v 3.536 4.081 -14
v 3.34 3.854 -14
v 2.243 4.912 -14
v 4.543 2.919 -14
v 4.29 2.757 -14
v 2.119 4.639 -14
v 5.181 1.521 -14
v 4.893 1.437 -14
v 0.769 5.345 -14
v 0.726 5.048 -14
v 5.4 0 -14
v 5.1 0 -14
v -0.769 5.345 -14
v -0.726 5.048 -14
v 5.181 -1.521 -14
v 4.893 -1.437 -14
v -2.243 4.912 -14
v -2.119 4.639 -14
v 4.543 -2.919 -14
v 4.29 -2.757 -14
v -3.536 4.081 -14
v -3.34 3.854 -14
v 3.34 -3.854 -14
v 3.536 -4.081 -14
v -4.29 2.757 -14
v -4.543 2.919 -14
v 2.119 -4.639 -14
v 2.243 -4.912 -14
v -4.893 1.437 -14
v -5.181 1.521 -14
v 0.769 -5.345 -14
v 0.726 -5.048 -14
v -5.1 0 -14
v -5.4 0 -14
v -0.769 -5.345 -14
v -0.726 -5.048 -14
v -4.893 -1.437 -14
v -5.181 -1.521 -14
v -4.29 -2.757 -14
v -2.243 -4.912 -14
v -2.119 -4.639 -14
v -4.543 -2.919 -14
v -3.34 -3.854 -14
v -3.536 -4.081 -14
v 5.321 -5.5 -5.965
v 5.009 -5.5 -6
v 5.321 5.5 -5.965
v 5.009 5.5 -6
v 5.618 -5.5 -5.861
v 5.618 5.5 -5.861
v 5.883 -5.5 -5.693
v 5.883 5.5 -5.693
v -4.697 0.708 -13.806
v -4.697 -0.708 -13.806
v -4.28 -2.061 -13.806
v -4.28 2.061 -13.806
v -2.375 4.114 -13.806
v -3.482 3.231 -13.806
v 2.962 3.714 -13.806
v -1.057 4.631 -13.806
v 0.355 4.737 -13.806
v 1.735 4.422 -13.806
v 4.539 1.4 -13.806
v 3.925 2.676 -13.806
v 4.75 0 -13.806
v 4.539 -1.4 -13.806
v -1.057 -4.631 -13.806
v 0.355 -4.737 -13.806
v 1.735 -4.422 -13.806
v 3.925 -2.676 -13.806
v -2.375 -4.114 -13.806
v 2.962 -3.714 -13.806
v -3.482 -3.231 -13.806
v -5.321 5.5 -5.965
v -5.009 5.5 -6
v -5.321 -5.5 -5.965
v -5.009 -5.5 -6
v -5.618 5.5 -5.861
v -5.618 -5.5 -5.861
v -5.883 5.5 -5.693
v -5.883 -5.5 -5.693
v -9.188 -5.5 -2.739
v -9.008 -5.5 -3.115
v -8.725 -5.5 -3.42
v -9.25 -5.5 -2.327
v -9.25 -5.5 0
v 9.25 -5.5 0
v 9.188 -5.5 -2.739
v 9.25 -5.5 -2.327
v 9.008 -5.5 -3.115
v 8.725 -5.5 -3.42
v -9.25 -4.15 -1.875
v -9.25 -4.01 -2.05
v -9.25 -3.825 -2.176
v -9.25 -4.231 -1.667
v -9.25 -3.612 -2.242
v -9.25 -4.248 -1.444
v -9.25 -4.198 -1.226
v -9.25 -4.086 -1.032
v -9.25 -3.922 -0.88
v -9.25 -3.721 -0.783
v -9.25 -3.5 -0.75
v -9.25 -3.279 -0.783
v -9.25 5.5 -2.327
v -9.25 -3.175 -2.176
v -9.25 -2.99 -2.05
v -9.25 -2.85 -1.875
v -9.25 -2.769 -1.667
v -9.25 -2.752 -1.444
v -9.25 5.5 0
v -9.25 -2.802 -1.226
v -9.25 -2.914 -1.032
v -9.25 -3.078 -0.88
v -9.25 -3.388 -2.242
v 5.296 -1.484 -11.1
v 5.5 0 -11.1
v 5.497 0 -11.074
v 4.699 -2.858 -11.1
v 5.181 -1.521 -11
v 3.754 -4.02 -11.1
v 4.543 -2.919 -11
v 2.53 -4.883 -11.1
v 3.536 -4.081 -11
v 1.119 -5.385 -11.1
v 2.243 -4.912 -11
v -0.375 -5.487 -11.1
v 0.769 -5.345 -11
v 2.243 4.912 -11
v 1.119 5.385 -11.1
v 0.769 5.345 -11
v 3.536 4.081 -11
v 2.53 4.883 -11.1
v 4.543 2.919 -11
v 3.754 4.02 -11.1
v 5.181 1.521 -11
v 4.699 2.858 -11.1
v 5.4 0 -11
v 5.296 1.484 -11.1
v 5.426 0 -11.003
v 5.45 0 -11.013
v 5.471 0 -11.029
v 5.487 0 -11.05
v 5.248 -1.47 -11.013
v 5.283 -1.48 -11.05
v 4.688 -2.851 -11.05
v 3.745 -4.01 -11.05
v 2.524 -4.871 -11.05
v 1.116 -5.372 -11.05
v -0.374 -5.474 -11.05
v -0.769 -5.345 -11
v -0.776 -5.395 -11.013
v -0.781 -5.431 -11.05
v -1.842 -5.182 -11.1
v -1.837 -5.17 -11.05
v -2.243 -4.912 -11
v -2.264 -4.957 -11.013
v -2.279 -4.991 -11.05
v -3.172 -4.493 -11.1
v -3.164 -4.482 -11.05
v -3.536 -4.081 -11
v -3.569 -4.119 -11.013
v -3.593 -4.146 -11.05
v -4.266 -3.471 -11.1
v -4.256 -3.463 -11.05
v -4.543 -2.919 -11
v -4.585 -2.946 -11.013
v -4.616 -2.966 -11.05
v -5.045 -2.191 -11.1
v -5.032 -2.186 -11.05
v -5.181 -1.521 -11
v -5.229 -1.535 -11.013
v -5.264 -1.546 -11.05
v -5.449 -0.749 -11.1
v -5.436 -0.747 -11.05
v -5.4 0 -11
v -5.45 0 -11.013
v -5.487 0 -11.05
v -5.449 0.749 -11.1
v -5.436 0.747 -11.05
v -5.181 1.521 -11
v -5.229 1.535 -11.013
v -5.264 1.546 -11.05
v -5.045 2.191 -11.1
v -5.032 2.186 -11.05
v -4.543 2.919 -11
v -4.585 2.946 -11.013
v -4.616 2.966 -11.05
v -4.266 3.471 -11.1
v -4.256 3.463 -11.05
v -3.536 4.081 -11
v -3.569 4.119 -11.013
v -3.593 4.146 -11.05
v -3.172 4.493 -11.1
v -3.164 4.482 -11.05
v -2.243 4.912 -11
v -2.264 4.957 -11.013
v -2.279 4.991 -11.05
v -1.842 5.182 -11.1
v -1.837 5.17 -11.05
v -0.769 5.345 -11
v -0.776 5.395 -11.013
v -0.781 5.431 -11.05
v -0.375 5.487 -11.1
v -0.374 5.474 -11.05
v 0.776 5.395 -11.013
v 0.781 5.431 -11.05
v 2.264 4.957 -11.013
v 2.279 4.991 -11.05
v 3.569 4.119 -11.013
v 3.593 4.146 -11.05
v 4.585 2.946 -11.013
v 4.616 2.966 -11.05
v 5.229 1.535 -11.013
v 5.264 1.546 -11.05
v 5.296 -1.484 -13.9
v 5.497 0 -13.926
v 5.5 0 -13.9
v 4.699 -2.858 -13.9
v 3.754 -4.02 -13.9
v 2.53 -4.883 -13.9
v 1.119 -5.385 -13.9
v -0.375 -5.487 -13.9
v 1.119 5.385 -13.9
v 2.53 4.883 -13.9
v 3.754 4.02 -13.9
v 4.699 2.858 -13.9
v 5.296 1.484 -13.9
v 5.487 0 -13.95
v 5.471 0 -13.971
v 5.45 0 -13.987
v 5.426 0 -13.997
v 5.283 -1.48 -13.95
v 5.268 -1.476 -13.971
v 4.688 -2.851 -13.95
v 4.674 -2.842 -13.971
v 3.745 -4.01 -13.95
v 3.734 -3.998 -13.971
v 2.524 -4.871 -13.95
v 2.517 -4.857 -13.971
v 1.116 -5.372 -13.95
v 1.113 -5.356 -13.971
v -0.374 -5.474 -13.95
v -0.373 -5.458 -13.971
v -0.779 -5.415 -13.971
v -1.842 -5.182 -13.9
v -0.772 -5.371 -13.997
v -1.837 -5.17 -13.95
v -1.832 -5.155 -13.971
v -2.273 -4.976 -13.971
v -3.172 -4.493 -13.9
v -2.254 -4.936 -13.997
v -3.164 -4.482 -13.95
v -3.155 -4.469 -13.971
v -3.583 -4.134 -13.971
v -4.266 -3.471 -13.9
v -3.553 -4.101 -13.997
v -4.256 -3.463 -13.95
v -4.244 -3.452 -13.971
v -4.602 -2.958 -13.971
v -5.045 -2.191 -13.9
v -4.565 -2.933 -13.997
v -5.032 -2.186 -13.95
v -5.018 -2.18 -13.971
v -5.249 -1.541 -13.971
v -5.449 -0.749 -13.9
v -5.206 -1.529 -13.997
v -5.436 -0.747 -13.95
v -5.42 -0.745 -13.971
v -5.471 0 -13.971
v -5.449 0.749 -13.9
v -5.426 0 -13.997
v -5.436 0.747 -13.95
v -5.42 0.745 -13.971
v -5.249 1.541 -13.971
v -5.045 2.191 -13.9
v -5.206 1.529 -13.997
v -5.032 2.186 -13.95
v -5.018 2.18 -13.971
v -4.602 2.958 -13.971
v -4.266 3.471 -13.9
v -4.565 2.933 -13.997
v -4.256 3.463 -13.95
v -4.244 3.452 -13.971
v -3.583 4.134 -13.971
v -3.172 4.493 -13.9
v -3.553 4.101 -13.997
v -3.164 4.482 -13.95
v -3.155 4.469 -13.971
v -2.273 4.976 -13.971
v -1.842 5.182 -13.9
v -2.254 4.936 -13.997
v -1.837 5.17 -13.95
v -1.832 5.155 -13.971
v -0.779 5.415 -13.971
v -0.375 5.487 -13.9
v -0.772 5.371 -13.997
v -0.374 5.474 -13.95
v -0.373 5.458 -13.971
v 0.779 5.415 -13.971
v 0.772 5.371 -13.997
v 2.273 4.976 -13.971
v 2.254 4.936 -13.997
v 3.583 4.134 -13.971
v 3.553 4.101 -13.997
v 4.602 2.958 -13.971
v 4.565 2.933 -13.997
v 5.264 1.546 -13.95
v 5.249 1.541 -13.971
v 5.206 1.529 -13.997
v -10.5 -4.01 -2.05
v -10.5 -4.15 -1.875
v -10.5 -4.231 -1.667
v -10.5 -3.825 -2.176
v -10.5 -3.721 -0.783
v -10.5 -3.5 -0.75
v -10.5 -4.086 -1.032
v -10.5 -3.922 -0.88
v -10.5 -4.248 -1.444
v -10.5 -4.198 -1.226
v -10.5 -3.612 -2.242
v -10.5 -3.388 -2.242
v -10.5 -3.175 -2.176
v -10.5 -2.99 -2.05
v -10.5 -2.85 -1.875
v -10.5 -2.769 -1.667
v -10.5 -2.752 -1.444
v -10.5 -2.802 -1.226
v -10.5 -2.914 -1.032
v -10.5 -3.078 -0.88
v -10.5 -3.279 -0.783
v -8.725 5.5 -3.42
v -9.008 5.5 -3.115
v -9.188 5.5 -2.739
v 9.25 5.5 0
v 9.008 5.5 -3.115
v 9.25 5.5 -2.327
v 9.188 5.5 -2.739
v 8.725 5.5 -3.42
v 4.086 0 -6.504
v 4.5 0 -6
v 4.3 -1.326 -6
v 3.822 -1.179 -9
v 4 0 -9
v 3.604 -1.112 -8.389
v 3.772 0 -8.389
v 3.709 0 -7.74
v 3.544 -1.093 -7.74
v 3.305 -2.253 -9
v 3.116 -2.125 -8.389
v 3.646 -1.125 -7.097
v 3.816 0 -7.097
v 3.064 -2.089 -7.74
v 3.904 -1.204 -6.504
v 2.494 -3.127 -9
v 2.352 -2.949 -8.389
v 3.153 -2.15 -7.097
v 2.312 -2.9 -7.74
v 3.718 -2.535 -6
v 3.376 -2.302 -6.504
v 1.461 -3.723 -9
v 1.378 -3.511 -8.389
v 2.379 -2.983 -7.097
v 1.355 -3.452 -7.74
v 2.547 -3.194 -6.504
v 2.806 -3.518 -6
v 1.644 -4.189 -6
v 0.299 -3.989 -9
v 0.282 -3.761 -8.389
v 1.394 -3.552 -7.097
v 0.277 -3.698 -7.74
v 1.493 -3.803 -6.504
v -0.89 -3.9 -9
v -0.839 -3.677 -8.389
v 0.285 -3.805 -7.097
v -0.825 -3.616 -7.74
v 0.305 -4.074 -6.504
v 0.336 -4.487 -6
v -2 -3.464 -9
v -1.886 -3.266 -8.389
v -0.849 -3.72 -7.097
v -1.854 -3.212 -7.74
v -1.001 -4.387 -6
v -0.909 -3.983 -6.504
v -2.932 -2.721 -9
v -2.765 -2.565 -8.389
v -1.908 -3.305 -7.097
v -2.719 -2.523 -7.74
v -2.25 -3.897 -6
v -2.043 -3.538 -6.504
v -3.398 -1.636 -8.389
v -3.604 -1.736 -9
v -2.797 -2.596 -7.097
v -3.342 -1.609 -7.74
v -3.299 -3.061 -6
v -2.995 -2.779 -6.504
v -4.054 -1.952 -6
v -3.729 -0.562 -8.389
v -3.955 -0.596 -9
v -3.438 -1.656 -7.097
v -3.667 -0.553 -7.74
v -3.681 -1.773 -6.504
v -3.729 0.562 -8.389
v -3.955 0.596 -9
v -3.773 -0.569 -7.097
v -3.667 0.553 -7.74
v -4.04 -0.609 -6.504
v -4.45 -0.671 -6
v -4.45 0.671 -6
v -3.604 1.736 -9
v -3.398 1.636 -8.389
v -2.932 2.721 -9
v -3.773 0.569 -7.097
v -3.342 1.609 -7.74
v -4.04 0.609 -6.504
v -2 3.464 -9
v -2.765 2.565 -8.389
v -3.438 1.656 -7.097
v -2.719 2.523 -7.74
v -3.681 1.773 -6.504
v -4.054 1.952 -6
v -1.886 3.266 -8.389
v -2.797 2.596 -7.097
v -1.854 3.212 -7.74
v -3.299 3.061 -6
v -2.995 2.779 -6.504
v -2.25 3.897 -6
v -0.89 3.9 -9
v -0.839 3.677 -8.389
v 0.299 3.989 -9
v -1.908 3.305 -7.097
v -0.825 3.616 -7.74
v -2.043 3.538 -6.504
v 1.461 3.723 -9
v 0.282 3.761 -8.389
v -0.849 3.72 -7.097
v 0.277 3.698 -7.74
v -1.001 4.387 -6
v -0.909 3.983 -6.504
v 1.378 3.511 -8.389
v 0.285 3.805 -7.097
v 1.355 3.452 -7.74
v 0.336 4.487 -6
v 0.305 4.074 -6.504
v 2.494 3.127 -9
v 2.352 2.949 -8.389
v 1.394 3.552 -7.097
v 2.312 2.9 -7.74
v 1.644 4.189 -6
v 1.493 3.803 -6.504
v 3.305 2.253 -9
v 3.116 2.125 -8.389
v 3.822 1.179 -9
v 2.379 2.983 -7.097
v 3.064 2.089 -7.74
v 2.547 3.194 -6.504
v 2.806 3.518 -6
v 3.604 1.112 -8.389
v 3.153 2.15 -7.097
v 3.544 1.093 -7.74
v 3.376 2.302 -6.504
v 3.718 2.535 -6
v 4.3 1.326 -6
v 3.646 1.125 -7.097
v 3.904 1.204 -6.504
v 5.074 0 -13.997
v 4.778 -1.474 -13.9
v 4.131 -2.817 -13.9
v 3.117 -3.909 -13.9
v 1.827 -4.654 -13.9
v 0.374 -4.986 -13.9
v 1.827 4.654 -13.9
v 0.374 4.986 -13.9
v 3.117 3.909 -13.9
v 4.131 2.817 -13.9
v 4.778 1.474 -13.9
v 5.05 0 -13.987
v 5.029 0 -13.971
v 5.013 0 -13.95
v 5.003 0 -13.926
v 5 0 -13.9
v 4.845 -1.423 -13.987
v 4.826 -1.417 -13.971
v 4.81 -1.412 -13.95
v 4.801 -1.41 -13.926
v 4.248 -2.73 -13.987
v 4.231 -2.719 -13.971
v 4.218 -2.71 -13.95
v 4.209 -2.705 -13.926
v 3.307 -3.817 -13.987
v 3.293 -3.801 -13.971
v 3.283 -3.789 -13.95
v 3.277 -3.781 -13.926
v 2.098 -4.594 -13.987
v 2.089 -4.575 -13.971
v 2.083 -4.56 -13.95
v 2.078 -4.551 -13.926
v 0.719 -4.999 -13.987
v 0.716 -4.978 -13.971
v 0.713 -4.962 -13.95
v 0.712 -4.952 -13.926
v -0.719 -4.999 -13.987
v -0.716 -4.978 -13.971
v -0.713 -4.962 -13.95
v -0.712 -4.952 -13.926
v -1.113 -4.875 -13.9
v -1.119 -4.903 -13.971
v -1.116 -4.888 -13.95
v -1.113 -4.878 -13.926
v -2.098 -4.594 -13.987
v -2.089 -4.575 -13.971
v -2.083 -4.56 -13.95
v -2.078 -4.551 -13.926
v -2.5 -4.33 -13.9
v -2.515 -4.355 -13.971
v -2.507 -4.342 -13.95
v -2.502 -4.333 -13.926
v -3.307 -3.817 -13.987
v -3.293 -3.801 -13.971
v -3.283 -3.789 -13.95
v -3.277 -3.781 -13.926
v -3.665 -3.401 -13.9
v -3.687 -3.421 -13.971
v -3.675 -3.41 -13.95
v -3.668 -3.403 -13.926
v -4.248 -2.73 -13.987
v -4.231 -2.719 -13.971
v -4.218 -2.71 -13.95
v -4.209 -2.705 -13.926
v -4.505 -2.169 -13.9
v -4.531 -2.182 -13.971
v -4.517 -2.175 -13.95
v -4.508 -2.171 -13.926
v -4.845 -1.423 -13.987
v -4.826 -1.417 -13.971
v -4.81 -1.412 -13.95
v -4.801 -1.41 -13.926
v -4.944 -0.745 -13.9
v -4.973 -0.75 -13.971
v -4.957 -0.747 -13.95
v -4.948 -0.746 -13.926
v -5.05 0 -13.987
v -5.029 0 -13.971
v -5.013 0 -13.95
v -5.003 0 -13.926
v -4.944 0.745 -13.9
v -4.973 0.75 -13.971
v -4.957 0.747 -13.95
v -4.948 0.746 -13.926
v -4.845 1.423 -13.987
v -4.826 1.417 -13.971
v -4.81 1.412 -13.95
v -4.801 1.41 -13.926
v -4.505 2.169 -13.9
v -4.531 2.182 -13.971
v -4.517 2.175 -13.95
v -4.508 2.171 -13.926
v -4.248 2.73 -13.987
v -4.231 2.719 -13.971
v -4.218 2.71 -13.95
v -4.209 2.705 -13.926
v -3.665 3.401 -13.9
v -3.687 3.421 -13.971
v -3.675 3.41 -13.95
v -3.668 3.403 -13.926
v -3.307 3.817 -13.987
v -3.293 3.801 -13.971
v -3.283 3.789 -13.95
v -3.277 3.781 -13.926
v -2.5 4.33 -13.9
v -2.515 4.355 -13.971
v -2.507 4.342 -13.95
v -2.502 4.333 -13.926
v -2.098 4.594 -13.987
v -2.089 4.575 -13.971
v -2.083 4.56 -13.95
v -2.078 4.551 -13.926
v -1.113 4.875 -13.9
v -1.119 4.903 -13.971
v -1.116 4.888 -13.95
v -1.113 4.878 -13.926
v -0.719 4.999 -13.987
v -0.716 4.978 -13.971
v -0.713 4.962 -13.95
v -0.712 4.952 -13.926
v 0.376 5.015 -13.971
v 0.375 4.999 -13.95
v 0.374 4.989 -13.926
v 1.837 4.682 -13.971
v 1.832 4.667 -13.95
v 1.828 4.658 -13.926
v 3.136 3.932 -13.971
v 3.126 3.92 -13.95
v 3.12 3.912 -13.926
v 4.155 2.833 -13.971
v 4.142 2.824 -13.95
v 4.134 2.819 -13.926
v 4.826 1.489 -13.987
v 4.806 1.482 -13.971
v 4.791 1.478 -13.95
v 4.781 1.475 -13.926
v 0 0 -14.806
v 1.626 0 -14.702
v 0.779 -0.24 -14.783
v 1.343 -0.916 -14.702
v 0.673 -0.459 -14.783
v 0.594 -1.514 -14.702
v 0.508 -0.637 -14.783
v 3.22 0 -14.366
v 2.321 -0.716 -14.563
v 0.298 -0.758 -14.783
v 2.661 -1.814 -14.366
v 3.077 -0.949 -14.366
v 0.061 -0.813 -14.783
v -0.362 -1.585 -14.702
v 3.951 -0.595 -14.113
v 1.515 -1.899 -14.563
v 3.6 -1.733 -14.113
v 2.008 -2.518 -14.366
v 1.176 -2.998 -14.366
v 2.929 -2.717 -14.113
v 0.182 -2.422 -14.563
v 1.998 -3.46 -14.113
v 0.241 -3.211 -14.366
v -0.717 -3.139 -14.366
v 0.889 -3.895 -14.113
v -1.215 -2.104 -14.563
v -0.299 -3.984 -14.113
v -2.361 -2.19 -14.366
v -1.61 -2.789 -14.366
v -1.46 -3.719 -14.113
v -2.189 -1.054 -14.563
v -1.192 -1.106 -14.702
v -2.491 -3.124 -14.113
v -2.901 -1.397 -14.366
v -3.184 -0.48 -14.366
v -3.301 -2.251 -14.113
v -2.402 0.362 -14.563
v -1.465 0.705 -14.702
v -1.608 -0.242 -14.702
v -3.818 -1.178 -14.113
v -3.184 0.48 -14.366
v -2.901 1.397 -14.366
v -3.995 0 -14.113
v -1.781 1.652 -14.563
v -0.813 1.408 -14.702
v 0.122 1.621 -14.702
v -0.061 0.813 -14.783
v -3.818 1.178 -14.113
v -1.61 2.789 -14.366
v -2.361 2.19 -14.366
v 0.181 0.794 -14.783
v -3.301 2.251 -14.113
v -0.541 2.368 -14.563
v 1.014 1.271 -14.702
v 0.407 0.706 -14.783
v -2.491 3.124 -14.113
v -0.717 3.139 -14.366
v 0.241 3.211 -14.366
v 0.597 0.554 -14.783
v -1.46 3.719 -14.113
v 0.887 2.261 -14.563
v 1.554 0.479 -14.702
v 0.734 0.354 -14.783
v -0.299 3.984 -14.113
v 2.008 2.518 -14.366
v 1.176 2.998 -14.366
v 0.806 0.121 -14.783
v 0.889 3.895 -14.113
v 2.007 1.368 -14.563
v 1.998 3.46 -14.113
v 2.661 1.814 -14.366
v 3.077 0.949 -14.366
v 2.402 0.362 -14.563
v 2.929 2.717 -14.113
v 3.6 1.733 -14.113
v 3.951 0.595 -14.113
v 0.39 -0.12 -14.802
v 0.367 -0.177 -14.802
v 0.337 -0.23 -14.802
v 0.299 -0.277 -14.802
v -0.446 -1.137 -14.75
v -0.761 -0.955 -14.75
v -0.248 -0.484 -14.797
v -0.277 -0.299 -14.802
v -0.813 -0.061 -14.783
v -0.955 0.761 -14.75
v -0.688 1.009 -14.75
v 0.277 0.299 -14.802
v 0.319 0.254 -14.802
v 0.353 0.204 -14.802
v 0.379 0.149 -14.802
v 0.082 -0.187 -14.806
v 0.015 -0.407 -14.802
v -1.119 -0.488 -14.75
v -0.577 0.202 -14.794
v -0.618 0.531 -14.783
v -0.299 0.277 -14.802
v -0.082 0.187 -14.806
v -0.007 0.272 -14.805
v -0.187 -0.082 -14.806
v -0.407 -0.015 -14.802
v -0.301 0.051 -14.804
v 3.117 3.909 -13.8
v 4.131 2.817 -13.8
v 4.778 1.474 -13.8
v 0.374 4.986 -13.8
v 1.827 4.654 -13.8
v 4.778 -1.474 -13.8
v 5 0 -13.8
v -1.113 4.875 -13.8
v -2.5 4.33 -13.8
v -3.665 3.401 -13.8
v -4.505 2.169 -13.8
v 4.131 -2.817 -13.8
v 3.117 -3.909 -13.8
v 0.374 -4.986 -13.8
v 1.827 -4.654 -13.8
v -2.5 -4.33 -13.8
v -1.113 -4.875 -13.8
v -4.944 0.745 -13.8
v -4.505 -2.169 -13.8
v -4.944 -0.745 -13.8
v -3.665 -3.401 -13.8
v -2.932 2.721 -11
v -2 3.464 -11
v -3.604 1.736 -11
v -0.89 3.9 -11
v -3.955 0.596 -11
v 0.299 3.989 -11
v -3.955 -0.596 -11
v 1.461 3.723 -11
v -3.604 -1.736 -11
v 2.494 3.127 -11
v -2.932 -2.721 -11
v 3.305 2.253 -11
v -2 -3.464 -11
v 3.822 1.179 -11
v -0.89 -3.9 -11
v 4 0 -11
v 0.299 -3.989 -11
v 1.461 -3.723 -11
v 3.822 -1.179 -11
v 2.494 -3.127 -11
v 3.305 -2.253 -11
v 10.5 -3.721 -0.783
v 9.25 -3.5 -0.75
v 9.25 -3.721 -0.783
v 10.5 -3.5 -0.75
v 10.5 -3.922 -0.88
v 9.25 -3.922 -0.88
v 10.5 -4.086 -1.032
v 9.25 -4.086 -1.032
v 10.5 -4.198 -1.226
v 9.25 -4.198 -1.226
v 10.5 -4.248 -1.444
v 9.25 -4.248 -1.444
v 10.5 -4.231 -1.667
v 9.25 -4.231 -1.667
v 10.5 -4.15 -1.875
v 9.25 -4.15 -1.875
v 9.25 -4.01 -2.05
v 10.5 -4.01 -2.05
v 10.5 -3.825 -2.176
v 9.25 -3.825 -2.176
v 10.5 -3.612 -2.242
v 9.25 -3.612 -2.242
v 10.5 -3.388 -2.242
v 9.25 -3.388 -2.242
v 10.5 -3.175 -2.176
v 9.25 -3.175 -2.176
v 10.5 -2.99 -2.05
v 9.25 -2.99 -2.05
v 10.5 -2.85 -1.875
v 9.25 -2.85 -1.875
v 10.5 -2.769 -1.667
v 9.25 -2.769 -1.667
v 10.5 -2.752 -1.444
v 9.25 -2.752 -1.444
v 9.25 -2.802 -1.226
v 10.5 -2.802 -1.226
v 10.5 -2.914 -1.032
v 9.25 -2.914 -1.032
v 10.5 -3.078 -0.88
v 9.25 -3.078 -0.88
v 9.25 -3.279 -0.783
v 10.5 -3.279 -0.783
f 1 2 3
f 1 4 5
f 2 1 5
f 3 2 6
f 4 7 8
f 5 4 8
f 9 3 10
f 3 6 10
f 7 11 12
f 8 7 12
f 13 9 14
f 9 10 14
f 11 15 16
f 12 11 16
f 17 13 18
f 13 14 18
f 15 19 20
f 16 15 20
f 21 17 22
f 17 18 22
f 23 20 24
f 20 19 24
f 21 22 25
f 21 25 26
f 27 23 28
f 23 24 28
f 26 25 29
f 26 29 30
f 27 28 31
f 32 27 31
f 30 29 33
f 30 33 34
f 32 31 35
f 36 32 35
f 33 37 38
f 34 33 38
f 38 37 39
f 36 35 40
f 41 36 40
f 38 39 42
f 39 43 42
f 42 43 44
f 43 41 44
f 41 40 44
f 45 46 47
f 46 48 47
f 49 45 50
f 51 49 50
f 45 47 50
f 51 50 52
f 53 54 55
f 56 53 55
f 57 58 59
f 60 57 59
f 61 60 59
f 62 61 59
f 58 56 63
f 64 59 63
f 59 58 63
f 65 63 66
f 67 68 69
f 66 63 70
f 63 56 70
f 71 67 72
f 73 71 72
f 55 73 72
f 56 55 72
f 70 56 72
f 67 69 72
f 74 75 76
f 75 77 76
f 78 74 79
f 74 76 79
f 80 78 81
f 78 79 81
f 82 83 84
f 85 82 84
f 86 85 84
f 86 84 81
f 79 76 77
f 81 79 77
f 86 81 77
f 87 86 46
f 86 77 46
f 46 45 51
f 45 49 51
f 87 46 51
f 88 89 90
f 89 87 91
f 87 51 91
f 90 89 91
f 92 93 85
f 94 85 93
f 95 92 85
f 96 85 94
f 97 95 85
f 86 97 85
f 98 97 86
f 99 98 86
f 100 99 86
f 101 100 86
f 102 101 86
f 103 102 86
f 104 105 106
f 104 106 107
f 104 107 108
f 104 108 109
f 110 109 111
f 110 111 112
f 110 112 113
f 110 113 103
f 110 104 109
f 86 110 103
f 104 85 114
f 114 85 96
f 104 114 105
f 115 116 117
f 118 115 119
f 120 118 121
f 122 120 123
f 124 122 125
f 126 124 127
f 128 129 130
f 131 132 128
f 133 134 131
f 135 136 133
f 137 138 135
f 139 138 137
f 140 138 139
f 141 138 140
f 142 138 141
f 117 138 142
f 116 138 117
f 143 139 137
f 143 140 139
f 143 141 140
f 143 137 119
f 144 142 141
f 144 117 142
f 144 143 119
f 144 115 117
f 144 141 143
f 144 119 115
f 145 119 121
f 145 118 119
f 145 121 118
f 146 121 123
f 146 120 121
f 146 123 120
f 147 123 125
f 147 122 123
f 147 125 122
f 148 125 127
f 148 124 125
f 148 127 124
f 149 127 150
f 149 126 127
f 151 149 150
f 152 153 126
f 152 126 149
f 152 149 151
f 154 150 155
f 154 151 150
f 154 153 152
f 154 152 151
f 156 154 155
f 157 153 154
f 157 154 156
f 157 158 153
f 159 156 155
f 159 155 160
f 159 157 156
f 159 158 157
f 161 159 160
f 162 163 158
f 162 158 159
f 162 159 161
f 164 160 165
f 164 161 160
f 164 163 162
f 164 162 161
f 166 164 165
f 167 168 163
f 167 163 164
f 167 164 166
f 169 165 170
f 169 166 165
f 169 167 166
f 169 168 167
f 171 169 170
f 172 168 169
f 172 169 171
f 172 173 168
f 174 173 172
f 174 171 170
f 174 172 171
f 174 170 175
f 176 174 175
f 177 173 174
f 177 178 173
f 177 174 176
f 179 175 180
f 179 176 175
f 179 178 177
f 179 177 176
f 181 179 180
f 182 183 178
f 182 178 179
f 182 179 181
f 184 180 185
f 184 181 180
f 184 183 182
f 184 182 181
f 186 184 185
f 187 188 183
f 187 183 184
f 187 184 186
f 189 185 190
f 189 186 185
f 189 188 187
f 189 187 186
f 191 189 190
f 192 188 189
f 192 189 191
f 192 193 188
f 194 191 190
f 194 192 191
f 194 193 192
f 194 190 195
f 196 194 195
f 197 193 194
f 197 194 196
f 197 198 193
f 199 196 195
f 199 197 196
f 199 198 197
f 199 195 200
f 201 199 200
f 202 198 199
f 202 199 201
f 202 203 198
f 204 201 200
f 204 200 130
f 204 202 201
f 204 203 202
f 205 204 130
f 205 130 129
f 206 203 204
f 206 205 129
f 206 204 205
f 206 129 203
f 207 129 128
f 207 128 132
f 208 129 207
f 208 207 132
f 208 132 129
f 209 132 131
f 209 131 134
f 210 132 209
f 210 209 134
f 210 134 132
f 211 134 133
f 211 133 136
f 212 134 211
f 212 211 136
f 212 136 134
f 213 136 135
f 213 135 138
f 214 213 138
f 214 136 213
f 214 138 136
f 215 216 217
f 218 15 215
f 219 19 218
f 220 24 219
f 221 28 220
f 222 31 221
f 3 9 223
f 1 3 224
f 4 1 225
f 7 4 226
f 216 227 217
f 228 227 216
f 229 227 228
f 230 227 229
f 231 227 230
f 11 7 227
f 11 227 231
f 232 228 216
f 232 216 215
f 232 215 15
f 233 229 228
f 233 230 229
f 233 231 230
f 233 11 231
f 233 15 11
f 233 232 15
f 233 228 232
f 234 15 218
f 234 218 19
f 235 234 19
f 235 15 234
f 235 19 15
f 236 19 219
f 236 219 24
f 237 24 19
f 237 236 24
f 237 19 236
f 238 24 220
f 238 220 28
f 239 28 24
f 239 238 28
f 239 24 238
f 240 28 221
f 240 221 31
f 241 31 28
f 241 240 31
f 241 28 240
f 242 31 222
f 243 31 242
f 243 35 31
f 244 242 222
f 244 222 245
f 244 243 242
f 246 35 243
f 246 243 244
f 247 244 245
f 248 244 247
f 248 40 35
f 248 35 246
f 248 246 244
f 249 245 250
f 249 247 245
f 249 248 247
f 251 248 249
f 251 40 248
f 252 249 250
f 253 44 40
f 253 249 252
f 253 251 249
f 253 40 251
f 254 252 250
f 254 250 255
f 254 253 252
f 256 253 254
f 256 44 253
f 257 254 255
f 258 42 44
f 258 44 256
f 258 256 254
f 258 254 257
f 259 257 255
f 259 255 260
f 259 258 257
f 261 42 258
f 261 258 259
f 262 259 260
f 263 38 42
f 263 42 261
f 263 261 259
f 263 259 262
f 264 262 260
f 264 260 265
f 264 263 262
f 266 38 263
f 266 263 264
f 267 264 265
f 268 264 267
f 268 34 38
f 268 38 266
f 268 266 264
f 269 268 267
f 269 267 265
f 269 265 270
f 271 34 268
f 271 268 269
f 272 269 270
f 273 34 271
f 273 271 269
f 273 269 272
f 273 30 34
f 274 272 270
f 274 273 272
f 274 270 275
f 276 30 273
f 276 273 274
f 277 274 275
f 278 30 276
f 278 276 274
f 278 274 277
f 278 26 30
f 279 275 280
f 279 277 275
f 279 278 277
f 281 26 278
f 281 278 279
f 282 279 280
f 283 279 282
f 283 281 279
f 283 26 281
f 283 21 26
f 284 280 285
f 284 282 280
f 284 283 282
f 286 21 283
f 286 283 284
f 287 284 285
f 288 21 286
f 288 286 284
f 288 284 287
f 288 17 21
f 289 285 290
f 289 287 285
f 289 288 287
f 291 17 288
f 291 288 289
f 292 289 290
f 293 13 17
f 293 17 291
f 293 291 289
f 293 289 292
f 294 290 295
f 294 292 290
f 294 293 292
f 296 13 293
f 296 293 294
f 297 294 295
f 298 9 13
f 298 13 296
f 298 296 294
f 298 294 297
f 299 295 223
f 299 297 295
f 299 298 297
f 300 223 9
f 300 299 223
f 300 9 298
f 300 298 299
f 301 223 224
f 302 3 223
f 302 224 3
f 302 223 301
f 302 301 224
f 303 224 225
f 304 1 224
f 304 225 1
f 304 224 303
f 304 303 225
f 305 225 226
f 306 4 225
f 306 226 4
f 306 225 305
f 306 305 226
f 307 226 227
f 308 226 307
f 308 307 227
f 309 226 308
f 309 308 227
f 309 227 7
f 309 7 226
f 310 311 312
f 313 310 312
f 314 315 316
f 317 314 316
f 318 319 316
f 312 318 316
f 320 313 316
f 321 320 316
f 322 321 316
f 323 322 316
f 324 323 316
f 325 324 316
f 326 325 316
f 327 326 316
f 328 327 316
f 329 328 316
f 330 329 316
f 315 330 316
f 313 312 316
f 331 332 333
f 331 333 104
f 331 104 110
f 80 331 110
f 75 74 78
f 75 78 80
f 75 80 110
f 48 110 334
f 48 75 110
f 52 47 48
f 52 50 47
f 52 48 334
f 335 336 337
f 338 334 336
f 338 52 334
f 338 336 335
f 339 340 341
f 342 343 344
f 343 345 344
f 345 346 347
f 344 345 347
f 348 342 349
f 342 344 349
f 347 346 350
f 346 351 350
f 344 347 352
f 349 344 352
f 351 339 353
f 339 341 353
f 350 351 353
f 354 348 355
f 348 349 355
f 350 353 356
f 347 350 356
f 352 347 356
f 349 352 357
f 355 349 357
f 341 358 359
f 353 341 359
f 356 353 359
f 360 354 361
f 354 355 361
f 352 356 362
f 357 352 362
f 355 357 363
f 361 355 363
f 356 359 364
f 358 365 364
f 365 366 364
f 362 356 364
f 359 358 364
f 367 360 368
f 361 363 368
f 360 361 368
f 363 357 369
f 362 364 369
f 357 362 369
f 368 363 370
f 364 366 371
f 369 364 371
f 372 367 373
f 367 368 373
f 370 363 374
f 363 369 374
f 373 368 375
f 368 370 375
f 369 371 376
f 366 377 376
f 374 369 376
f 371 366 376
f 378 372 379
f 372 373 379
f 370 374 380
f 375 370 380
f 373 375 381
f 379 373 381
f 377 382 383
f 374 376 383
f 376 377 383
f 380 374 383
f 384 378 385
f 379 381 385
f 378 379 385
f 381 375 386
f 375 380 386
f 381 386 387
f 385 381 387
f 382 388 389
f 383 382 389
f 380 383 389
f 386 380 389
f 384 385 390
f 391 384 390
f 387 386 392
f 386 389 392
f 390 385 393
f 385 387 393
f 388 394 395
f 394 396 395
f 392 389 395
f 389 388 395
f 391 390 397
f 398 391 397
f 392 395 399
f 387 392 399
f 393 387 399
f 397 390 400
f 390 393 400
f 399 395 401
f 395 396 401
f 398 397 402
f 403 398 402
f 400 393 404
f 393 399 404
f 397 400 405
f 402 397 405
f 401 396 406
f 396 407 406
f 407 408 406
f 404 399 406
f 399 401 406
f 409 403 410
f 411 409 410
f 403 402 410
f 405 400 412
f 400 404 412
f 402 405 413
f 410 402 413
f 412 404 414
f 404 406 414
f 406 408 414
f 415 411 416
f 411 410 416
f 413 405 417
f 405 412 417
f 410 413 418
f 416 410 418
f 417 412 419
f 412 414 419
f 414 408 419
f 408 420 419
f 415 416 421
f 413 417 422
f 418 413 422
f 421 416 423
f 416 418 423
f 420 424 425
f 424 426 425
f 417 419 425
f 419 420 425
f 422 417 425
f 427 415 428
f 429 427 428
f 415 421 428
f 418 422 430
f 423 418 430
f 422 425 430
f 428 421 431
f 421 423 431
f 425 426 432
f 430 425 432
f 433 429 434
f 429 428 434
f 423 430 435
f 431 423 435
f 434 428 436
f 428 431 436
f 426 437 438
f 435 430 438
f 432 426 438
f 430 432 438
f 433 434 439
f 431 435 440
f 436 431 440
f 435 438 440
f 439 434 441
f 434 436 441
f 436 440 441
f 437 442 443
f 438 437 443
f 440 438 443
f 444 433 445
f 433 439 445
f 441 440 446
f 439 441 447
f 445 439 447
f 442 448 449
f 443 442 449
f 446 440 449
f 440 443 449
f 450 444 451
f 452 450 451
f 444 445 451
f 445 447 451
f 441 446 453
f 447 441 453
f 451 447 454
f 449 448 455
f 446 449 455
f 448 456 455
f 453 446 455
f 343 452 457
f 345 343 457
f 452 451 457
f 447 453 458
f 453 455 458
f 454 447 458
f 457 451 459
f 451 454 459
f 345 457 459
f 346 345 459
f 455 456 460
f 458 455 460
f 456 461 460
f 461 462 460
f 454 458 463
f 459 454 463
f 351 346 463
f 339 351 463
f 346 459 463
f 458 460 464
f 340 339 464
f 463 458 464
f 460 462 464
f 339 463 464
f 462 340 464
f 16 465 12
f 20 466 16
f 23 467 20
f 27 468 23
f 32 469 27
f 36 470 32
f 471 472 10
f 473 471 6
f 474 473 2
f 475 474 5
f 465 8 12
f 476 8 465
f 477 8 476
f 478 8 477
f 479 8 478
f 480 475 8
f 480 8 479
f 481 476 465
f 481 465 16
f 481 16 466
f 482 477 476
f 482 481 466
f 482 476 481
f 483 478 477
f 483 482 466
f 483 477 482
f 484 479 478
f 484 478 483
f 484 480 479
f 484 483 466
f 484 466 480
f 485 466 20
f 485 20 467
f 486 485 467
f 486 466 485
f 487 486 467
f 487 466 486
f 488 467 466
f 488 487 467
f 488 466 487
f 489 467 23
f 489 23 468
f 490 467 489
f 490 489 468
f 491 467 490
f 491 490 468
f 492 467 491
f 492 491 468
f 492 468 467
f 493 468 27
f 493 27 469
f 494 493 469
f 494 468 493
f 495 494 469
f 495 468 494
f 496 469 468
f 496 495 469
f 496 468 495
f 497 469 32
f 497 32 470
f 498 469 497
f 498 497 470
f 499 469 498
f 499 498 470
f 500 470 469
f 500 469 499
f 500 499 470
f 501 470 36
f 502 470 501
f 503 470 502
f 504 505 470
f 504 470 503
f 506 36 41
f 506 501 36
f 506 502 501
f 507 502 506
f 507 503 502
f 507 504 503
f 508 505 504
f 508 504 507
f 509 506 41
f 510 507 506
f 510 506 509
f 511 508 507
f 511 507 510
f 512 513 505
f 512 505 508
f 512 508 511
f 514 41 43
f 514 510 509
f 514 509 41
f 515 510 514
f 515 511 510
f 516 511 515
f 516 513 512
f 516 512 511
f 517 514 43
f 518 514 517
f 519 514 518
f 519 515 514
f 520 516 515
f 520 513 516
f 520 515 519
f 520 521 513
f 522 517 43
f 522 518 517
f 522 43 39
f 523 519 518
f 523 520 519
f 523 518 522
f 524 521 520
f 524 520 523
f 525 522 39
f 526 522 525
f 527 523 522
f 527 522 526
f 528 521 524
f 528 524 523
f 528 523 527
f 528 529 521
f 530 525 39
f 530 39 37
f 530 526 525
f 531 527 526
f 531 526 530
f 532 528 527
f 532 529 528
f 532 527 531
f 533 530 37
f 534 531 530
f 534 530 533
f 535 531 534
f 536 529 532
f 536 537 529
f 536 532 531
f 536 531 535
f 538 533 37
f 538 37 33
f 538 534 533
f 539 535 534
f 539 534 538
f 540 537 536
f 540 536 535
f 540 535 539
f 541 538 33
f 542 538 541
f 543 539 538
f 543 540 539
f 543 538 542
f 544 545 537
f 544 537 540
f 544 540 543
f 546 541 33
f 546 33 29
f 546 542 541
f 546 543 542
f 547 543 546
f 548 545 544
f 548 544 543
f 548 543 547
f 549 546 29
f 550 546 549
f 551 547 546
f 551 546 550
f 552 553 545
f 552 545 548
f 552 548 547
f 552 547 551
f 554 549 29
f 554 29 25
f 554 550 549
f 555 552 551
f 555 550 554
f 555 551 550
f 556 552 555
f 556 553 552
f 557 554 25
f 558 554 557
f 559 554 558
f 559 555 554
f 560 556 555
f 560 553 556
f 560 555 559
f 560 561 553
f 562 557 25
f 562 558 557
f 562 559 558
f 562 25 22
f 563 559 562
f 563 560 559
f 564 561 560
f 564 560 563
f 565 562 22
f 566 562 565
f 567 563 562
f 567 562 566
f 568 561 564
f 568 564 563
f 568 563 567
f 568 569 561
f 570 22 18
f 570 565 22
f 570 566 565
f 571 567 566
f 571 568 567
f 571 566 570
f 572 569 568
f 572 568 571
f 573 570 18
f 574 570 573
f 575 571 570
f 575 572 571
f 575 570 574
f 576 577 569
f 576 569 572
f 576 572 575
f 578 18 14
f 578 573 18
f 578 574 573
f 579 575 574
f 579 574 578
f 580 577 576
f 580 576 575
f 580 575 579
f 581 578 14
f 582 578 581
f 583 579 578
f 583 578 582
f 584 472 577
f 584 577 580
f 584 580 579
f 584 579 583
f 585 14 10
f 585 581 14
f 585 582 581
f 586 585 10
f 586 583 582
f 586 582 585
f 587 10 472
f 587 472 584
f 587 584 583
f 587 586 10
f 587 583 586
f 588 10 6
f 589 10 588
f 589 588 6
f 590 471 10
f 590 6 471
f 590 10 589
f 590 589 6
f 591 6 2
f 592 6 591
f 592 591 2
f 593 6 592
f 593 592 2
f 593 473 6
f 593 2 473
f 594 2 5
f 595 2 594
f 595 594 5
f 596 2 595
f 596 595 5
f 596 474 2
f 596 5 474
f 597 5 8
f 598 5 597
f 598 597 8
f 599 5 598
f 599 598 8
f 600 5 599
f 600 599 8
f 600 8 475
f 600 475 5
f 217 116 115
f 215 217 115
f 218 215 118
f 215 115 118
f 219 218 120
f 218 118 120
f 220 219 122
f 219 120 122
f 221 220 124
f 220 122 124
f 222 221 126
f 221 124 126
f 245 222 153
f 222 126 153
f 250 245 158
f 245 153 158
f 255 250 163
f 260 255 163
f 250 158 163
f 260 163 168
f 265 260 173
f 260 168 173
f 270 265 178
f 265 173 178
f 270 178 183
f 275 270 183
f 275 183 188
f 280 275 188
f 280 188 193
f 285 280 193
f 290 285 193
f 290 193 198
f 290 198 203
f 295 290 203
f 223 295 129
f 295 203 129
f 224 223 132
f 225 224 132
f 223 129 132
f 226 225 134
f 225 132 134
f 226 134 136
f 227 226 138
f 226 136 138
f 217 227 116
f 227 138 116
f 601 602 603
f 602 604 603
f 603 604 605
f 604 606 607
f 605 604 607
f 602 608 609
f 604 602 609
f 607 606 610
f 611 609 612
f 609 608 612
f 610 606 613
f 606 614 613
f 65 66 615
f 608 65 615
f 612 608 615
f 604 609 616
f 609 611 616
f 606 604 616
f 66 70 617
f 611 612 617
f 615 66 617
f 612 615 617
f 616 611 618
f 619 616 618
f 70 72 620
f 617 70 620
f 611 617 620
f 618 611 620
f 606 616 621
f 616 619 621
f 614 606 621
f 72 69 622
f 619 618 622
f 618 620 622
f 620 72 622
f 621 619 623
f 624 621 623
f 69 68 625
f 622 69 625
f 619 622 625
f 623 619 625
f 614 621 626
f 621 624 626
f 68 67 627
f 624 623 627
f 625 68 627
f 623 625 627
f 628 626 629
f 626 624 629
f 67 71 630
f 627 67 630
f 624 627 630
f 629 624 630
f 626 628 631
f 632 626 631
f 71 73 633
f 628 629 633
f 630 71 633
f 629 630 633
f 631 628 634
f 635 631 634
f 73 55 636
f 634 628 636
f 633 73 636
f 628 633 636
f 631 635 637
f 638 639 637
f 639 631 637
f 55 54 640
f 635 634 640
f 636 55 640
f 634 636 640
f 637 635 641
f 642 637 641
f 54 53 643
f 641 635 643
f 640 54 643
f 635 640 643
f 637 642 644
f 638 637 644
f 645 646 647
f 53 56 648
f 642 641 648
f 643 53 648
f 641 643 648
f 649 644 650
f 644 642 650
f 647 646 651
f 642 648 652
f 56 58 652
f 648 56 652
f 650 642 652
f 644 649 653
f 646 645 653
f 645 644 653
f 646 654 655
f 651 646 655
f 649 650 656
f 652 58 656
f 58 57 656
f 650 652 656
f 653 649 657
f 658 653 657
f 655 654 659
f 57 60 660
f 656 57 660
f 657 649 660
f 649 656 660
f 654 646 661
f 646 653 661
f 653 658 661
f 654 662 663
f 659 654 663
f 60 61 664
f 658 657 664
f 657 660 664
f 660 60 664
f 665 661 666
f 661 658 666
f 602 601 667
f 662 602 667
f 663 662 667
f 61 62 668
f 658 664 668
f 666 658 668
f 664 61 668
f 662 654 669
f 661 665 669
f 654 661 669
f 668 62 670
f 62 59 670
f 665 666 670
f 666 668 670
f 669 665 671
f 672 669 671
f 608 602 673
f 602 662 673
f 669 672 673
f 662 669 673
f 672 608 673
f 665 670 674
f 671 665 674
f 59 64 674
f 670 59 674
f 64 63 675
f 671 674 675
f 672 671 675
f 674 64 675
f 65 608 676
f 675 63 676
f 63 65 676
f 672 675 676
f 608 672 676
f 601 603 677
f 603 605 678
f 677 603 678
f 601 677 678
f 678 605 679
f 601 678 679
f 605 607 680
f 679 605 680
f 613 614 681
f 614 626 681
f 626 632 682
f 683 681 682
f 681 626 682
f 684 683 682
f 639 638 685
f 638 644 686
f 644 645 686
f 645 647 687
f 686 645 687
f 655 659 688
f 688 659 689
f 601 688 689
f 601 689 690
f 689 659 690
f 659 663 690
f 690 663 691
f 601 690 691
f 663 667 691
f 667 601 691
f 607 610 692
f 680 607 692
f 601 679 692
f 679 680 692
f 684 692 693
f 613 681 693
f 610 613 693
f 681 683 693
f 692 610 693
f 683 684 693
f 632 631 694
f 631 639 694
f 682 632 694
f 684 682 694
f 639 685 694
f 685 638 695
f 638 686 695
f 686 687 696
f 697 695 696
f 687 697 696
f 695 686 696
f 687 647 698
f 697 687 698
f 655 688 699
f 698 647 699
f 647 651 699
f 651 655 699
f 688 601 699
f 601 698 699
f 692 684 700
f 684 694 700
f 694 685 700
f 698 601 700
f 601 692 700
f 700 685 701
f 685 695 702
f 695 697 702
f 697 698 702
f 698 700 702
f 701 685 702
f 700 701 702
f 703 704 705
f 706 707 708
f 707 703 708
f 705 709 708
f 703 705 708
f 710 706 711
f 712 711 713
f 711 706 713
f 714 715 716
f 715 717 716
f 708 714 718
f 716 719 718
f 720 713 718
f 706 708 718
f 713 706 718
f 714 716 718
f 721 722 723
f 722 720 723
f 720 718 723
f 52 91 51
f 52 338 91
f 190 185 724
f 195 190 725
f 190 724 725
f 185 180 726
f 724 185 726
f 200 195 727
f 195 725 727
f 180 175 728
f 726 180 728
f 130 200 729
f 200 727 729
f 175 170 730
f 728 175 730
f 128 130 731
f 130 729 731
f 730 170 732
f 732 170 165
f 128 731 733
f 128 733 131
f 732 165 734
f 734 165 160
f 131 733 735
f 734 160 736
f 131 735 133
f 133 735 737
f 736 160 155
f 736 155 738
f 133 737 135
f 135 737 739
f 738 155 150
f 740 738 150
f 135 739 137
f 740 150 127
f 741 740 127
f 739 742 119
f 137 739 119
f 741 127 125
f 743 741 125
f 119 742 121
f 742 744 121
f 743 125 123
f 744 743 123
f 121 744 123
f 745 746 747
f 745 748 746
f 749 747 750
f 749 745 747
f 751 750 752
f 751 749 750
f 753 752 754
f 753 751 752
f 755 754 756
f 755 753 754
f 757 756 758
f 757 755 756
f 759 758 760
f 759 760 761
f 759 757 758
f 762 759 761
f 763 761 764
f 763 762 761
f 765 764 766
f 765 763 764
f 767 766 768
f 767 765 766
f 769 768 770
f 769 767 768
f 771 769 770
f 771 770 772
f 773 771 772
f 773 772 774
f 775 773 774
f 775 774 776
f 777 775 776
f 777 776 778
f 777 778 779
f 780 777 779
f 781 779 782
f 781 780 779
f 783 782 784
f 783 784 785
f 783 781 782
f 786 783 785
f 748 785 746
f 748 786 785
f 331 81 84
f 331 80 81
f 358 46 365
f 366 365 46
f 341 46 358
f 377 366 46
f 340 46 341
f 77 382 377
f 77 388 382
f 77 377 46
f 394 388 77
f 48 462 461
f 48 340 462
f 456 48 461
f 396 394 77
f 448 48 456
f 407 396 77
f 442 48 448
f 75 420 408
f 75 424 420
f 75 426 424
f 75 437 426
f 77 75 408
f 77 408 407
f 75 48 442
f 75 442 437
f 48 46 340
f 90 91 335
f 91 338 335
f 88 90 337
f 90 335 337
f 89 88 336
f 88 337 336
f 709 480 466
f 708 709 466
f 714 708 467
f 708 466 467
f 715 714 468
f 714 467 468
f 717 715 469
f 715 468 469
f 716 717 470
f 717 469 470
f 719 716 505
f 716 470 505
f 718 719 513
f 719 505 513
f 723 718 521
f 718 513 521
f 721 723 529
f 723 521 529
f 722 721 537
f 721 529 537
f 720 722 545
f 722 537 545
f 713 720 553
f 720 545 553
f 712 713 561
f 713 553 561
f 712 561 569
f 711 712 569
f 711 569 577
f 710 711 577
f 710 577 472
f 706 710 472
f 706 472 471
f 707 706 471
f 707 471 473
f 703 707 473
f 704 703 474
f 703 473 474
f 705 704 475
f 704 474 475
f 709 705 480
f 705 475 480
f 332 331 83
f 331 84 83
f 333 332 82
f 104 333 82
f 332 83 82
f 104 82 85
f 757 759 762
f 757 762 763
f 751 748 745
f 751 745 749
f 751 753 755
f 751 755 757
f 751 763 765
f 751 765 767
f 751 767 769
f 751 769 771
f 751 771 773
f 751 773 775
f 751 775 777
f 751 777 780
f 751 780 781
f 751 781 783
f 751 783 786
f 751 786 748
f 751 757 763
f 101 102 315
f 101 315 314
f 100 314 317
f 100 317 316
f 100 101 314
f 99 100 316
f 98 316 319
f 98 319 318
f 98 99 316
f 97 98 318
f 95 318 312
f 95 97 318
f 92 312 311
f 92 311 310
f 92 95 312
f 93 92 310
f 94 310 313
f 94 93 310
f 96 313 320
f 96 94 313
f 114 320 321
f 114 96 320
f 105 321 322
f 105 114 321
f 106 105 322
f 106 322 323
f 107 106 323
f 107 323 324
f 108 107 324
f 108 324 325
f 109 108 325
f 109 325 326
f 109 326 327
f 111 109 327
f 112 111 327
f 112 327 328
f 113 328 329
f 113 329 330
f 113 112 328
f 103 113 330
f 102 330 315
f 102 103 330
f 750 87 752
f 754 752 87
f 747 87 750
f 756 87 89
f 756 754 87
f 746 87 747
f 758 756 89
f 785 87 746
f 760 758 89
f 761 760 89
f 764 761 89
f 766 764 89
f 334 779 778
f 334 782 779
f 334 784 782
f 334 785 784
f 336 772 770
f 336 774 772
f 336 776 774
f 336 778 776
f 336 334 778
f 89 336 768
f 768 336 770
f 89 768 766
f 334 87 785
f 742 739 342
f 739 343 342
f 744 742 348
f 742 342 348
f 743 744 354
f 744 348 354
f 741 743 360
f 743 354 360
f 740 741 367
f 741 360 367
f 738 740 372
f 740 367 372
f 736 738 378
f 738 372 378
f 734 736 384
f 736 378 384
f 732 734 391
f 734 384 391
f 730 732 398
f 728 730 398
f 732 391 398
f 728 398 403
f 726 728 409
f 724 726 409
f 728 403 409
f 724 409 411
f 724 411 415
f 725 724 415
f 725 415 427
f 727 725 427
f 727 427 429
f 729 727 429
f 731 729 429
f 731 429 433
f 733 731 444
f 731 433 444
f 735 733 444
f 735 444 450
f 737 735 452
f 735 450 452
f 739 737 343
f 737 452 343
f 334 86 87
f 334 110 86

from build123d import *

# Parameters (mm, degrees)
BOSS_EXTRUDE1_DEPTH = 5.5
SKETCH5_R           = 0.75
BOSS_EXTRUDE2_DEPTH = 10.5
FILLET1_R           = 0.1
FILLET2_R           = 1.4


with BuildPart() as part:
    # Sketch1 → Boss-Extrude1 (new, symmetric)
    with BuildSketch(Plane(origin=(0, 0, 0), x_dir=(1, 0, 0), z_dir=(0, 1, 0))):
        Polygon((-9.25, 0), (9.25, 0), (9.25, 3), (5.5, 6), (-5.5, 6), (-9.25, 3), align=None)
    extrude(amount=BOSS_EXTRUDE1_DEPTH, both=True)

    # Sketch3 → Revolve2 (revolve)
    with BuildSketch(Plane(origin=(0, 0, 0), x_dir=(1, 0, 0), z_dir=(0, 1, 0))):
        with BuildLine():
            Line((4.5, 6), (0, 6))
            Line((0, 6), (0, 13.8))
            Line((0, 13.8), (5, 13.8))
            Line((5, 13.8), (5, 14))
            Line((5, 14), (5.5, 14))
            Line((5.5, 14), (5.5, 11))
            Line((5.5, 11), (4, 11))
            Line((4, 11), (4, 9))
            ThreePointArc((4, 9), (3.741329953, 7.415221659), (4.5, 6))
        make_face()
    revolve(axis=Axis((0, 0, 0), (0, 0, -1)))

    # Sketch5 → Boss-Extrude2 (add, symmetric)
    with BuildSketch(Plane(origin=(0, 0, 0), x_dir=(0, 0, -1), z_dir=(1, 0, 0))):
        with Locations(Location((1.5, -3.5, 0), (0, 0, 180))):
            Circle(SKETCH5_R)
    extrude(amount=BOSS_EXTRUDE2_DEPTH, both=True)

    # Fillet1
    fillet1_edges = [part.edges().sort_by_distance(p)[0] for p in [
        (-5.5, 0, -11),
        (-5.5, 0, -14),
        (-5, 0, -14),
    ]]
    fillet(fillet1_edges, radius=FILLET1_R)

    # Fillet2
    fillet2_edges = [part.edges().sort_by_distance(p)[0] for p in [
        (-9.25, 0, -3),
        (-5.5, 0, -6),
        (5.5, 0, -6),
        (9.25, 0, -3),
    ]]
    fillet(fillet2_edges, radius=FILLET2_R)


with BuildPart() as body_2:
    # Sketch4 → Revolve3 (revolve)
    with BuildSketch(Plane(origin=(0, 0, 0), x_dir=(1, 0, 0), z_dir=(0, 1, 0))):
        with BuildLine():
            Line((0, 13.805740022), (0, 14.805740022))
            ThreePointArc((0, 14.805740022), (2.429085009, 14.562643816), (4.75, 13.805740022))
            Line((4.75, 13.805740022), (0, 13.805740022))
        make_face()
    revolve(axis=Axis((0, 0, -13.805740022), (0, 0, -1)))


solid = Compound([part.part, body_2.part])
